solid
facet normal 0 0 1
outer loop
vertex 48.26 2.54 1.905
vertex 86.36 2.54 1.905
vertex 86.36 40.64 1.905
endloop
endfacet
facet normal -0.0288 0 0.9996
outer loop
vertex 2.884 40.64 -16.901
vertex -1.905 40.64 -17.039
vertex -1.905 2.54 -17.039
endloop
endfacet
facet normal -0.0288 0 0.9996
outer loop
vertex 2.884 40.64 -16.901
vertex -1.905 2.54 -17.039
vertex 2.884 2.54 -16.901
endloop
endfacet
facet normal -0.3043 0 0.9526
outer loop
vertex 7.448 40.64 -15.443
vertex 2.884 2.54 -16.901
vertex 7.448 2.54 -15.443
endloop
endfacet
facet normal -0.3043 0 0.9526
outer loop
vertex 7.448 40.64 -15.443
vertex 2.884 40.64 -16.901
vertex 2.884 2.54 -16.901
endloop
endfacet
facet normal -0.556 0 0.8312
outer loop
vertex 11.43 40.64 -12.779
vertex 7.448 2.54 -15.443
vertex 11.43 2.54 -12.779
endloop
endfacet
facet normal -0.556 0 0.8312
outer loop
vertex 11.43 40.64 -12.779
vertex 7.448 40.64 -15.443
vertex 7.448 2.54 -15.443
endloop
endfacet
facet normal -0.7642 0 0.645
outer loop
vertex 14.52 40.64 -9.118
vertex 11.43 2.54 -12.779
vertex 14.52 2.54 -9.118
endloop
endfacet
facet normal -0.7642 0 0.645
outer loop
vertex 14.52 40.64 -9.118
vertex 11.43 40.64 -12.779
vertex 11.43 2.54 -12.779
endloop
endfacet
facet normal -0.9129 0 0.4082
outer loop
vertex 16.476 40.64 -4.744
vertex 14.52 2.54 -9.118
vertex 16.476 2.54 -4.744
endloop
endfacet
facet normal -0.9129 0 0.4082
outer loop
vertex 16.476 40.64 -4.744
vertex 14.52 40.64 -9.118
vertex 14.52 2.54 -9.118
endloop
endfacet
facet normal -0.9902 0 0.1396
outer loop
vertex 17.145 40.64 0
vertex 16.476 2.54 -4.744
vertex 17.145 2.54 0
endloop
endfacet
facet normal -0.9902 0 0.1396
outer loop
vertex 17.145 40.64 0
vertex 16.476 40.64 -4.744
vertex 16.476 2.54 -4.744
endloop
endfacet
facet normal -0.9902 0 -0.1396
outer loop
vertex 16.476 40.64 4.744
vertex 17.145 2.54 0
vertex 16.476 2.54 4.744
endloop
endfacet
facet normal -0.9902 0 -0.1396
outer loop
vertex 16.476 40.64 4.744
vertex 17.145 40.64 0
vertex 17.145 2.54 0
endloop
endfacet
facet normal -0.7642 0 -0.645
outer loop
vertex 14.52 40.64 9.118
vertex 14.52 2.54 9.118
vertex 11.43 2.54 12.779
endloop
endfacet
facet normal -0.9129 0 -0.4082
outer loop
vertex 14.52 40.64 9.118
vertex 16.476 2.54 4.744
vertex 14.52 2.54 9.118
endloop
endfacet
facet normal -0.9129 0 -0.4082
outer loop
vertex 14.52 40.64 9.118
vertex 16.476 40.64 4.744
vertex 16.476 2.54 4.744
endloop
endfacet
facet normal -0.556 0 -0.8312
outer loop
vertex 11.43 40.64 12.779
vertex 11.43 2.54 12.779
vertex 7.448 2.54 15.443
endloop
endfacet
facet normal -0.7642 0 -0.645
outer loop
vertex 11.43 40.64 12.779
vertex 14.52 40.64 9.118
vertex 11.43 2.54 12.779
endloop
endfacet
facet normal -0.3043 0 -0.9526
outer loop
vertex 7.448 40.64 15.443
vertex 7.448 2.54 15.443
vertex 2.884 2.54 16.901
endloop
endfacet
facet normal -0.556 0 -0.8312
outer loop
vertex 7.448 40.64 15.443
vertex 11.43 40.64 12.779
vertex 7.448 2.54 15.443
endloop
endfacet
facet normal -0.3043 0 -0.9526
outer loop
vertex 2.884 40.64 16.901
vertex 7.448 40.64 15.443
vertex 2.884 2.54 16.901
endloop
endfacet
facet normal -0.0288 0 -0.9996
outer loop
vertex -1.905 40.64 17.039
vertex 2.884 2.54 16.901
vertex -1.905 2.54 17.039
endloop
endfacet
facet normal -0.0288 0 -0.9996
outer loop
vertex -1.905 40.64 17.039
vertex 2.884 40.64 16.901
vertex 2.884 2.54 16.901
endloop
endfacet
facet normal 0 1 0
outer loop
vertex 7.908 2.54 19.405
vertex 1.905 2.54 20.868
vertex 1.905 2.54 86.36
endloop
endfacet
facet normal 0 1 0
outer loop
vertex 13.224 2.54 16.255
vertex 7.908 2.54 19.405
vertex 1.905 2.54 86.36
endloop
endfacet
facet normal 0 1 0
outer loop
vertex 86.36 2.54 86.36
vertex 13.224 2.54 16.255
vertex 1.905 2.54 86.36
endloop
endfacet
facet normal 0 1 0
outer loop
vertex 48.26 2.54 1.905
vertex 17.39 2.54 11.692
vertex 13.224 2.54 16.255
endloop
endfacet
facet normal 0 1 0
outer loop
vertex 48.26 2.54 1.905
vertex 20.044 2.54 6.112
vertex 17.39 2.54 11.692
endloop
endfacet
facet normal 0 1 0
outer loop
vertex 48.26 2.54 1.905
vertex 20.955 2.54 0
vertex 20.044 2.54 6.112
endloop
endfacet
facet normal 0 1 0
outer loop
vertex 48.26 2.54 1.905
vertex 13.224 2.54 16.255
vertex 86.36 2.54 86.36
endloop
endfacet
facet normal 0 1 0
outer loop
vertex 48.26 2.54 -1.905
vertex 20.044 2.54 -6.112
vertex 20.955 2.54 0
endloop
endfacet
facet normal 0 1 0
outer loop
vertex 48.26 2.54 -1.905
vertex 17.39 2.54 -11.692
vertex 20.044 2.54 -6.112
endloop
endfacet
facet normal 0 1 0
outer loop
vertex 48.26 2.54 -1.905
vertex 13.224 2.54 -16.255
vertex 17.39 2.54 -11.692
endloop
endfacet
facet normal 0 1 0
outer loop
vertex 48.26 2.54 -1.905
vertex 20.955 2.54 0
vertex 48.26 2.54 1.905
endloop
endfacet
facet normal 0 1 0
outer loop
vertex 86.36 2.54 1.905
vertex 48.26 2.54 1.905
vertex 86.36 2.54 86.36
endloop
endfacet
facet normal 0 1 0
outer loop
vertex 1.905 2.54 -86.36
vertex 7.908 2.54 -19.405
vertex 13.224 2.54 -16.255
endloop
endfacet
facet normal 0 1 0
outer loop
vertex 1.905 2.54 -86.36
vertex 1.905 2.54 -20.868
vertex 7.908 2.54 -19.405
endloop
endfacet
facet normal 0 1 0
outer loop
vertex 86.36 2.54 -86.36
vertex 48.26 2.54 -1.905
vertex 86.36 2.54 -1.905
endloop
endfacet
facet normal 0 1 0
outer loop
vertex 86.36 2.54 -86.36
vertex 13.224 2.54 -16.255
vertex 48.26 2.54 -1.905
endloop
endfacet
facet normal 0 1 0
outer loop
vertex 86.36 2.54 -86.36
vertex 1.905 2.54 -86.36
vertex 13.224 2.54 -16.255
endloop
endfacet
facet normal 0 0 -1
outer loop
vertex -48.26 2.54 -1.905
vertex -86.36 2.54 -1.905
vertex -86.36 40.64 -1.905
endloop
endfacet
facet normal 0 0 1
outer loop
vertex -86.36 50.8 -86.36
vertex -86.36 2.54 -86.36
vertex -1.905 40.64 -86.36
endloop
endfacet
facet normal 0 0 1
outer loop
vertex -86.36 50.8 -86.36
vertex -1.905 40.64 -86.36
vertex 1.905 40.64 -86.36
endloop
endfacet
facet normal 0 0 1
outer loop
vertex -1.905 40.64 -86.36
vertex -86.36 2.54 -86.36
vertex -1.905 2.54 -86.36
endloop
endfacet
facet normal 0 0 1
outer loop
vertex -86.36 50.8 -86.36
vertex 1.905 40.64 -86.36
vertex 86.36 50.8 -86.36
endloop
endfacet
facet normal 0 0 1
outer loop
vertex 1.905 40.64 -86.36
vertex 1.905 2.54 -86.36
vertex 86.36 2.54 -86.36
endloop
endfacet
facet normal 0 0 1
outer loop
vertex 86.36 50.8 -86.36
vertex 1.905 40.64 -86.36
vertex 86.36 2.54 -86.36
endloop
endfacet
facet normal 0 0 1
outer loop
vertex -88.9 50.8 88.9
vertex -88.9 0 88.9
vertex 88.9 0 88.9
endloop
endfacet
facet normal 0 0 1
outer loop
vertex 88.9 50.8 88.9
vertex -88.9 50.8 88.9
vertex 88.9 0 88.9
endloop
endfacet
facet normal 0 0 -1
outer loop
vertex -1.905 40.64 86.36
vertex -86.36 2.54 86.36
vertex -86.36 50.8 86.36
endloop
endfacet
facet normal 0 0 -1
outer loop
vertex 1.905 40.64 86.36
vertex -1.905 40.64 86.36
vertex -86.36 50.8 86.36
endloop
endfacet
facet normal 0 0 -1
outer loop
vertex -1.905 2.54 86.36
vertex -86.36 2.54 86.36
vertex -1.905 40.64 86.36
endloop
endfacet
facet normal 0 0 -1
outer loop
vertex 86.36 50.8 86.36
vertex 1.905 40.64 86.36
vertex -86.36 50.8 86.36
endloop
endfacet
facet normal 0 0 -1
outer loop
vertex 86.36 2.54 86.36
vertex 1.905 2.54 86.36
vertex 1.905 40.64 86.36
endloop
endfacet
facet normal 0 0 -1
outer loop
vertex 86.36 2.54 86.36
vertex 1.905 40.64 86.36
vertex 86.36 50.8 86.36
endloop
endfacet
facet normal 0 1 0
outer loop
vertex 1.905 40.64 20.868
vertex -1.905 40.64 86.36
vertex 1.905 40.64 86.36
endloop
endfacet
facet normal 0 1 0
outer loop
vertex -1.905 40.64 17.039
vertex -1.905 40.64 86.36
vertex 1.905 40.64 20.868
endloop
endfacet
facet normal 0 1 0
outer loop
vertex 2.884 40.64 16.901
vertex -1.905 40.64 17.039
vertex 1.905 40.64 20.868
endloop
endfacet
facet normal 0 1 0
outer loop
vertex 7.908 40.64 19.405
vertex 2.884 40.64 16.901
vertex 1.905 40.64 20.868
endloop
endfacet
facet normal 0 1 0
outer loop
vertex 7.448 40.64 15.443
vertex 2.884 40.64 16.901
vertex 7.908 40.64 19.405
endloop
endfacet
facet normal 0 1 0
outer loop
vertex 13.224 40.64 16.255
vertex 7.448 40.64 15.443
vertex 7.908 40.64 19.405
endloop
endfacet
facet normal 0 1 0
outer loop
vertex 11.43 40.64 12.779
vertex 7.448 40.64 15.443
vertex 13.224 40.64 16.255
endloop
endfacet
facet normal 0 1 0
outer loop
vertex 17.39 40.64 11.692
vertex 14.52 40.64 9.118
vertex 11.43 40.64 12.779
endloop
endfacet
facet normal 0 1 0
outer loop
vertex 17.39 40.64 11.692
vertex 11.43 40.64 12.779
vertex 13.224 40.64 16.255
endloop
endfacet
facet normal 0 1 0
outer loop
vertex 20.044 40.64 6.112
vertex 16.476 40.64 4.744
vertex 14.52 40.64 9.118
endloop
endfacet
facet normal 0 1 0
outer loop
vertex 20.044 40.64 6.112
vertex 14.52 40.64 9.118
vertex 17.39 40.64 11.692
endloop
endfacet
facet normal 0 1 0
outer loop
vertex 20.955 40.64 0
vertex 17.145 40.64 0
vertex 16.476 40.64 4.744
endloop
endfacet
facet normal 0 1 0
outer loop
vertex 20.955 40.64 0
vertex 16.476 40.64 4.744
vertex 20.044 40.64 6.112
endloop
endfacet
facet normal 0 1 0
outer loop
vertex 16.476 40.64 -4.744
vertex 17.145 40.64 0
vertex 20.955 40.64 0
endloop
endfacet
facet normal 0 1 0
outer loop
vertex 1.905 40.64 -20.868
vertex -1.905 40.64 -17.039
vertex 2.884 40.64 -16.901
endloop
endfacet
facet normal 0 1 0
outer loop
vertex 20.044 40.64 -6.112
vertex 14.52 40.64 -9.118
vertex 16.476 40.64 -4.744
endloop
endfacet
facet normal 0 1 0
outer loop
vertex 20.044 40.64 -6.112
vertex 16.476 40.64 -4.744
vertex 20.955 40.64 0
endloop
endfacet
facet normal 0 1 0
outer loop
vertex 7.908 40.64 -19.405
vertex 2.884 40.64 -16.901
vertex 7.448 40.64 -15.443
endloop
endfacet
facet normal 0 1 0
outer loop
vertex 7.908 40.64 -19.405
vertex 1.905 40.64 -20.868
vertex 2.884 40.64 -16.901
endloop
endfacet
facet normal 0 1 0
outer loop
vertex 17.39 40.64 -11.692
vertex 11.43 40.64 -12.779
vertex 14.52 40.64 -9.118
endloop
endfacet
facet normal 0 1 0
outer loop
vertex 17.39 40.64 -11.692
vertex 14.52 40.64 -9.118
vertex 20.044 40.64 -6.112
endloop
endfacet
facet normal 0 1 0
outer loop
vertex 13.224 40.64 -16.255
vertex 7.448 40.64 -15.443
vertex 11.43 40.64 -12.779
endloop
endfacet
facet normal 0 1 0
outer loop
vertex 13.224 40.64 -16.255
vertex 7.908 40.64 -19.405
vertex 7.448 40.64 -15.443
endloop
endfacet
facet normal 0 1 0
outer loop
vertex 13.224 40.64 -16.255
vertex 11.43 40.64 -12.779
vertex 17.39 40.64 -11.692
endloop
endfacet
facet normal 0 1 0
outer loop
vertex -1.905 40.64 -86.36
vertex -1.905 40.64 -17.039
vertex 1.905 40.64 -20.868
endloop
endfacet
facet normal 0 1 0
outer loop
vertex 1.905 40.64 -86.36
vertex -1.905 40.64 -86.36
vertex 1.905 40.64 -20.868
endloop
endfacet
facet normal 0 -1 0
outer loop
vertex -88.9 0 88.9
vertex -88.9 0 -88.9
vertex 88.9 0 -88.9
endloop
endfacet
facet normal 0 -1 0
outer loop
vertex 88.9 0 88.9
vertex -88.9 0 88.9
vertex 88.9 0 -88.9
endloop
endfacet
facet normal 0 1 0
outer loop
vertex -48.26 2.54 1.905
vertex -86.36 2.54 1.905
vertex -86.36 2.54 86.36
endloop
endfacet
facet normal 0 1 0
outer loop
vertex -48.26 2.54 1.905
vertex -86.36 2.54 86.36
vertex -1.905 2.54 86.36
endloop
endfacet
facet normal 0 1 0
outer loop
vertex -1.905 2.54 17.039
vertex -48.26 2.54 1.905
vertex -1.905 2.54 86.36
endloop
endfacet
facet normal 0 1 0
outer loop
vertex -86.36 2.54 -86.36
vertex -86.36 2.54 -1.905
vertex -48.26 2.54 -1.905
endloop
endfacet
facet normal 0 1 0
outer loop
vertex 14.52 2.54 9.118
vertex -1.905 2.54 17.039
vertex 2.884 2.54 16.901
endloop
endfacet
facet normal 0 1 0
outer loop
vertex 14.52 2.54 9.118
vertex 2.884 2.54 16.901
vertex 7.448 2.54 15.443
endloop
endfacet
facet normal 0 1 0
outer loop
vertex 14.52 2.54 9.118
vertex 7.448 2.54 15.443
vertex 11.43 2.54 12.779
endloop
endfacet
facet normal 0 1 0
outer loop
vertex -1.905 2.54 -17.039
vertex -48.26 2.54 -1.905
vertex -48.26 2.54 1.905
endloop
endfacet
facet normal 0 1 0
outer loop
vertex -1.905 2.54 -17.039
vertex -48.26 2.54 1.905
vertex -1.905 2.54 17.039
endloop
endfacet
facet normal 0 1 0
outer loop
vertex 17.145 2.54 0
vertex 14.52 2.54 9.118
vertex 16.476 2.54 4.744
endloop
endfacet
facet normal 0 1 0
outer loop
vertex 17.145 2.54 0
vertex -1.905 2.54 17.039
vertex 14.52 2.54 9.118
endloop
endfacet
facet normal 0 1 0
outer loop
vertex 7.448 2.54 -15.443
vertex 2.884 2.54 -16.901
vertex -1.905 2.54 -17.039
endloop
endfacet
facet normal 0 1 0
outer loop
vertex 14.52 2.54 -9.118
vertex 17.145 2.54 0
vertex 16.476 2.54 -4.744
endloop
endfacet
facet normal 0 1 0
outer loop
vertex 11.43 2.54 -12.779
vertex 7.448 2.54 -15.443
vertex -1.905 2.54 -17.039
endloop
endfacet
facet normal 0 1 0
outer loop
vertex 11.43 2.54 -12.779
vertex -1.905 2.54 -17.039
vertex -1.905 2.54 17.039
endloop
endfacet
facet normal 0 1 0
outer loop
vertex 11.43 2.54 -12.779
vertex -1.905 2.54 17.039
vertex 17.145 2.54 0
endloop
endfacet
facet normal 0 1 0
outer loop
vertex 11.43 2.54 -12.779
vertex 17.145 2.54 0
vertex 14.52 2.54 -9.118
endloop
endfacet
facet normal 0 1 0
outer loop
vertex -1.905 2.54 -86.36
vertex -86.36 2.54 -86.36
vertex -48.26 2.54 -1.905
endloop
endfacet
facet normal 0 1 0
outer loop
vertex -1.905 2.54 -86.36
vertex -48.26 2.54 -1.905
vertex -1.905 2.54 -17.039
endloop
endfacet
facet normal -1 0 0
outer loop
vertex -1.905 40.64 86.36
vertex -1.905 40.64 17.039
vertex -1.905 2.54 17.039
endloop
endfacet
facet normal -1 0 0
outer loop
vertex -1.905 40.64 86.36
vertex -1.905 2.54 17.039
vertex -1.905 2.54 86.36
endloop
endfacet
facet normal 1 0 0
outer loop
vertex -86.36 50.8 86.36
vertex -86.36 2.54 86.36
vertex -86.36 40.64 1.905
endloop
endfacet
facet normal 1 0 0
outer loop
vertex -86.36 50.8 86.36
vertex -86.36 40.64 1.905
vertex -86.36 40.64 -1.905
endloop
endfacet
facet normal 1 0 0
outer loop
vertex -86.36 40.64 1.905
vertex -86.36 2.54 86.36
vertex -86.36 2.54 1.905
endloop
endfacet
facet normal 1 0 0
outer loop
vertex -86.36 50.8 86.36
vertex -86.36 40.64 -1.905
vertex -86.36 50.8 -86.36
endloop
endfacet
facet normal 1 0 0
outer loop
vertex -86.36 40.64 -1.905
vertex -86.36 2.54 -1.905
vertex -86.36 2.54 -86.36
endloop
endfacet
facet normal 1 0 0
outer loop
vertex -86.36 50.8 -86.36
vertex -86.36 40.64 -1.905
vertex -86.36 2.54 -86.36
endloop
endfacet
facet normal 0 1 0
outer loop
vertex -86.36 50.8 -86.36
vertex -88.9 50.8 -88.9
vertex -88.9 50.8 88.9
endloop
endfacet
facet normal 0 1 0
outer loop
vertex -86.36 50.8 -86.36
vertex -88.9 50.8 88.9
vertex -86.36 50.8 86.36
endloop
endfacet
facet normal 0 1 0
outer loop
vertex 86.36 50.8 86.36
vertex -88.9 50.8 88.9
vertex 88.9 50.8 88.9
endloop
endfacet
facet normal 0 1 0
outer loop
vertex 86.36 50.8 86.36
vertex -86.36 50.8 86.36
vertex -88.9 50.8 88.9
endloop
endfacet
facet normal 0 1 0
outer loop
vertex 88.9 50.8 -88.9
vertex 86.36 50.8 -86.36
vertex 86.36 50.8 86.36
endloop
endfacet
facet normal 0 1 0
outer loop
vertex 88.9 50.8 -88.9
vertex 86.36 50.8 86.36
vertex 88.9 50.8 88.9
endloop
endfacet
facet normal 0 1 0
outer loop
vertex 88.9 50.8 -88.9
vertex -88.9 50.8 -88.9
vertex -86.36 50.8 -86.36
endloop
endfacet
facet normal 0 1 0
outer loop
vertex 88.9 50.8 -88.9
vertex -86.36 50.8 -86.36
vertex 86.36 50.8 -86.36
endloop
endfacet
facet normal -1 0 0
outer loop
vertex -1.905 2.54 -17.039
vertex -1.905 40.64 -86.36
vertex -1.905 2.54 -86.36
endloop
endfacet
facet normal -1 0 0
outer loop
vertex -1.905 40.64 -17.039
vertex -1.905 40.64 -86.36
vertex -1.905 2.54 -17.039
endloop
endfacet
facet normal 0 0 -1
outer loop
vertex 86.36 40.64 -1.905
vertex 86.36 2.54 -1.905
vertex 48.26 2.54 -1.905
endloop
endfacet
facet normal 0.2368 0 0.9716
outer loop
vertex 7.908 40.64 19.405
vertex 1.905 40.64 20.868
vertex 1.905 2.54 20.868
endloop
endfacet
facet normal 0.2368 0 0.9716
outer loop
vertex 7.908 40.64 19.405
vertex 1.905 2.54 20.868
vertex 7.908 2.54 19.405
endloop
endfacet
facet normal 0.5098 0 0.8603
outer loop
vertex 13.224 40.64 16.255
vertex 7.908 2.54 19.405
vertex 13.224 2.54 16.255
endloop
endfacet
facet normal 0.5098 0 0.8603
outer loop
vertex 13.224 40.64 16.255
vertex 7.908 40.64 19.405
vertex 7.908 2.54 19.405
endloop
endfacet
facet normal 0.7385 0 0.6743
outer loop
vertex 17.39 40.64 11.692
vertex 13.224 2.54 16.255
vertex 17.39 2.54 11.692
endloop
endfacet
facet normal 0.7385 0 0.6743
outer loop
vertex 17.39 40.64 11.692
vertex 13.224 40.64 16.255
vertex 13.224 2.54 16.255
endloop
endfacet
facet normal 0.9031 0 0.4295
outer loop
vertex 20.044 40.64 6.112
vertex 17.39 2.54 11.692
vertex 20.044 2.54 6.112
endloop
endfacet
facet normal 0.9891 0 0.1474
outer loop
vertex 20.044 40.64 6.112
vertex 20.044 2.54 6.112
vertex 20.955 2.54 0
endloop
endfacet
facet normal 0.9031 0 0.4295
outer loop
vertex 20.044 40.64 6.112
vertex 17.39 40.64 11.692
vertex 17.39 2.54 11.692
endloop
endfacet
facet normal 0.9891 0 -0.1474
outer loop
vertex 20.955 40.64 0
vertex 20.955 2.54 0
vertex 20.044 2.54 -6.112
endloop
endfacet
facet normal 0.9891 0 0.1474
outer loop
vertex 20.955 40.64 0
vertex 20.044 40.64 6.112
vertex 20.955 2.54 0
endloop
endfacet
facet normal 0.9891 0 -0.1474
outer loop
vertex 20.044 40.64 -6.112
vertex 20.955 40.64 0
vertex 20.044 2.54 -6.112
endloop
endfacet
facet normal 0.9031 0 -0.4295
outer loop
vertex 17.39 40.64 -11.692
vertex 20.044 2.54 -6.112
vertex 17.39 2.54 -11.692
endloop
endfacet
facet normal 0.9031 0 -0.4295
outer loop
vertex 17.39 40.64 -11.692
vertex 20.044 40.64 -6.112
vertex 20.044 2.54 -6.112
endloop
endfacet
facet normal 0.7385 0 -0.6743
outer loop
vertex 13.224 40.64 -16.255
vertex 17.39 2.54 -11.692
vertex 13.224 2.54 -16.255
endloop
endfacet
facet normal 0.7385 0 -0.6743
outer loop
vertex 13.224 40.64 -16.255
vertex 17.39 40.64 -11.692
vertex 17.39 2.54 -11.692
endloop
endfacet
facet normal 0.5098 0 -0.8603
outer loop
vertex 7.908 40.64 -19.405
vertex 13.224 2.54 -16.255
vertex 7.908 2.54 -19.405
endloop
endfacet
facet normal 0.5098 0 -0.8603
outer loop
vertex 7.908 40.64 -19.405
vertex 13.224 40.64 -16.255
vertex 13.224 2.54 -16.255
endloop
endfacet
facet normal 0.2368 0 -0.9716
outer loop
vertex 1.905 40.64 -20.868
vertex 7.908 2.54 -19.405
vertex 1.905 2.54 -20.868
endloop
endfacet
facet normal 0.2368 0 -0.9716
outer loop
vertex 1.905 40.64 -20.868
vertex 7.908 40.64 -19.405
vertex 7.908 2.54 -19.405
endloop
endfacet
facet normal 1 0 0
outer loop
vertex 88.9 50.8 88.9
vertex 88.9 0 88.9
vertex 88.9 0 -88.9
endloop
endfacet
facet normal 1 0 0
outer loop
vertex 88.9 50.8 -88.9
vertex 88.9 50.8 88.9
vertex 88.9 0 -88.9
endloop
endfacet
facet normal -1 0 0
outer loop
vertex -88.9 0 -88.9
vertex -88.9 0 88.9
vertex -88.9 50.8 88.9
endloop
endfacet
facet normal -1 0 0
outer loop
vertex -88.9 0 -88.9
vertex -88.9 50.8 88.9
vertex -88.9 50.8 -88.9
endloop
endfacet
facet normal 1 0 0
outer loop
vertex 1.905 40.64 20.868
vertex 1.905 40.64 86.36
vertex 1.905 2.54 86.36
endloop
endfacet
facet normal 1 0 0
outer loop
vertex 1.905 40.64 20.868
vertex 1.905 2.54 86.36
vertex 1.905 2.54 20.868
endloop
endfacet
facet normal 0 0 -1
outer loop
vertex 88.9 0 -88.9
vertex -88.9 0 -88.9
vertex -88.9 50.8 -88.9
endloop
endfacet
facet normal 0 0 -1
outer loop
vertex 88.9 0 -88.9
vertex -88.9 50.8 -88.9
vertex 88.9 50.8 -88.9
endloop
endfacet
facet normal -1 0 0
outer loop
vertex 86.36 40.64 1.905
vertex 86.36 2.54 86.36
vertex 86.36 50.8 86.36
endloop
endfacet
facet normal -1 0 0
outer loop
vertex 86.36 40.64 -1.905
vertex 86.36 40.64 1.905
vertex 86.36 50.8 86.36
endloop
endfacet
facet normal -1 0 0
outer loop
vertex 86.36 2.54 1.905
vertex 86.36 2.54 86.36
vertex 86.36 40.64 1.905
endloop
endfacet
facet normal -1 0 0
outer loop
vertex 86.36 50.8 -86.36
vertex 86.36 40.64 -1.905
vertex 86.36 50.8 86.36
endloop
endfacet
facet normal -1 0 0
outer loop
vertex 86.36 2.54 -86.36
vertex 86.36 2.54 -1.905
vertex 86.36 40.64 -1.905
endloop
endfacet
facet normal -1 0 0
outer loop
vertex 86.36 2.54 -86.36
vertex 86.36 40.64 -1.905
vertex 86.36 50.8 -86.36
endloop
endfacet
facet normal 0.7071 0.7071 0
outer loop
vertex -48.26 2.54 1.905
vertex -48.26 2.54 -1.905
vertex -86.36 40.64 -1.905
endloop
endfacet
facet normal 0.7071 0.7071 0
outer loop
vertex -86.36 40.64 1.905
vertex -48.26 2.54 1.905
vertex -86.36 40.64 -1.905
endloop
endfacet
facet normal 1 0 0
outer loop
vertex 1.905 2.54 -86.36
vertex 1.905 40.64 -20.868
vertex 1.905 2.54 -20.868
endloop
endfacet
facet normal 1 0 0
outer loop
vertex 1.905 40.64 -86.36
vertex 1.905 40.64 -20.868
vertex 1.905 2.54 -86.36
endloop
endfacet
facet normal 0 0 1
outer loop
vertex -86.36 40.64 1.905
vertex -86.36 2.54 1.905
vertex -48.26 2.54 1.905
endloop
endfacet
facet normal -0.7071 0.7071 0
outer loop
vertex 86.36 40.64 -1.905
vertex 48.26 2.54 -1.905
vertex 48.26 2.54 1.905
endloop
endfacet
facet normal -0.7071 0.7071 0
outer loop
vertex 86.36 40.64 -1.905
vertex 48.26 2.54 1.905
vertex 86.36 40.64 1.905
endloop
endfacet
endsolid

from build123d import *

# Parameters (mm, degrees)
SKETCH1_W           = 177.8
SKETCH1_H           = 177.8
BOSS_EXTRUDE1_DEPTH = 50.8
SHELL1_T            = -2.54
RIB2_REACH          = 137.599
SKETCH2_WALL_W      = 327.079324328
SKETCH2_WALL_H      = 3.81
RIB3_REACH          = 134.129


with BuildPart() as part:
    # Sketch1 → Boss-Extrude1 (new body)
    with BuildSketch(Plane(origin=(0, 0, 0), x_dir=(1, 0, 0), z_dir=(0, 1, 0))):
        Rectangle(SKETCH1_W, SKETCH1_H)
    extrude(amount=BOSS_EXTRUDE1_DEPTH)

    # Shell1
    shell1_openings = [part.faces().sort_by_distance(p)[0] for p in [
        (0, 50.8, 0),
    ]]
    offset(amount=SHELL1_T, openings=shell1_openings, kind=Kind.INTERSECTION)

    # Sketch2 wall → Rib2 (add, up to next)
    with BuildSketch(Plane(origin=(-67.31, 21.59, 0), x_dir=(0.707106781187, -0.707106781187, 0), z_dir=(0.707106781187, 0.707106781187, 0)), mode=Mode.PRIVATE) as rib2_sk1:
        Rectangle(SKETCH2_WALL_W, SKETCH2_WALL_H)
    rib2_tool1 = extrude(rib2_sk1.sketch, amount=-RIB2_REACH, mode=Mode.PRIVATE) - part.part
    rib2 = rib2_tool1.solids().sort_by_distance((-67.31, 21.59, 0))[0]
    add(rib2)

    # Mirror1: Rib2 across plane
    add(rib2.mirror(Plane(origin=(0, 0, 0), x_dir=(0, 0, 1), z_dir=(1, 0, 0))))

    # Sketch3 walls → Rib3 (add, up to next)
    with BuildSketch(Plane(origin=(0, 40.64, 0), x_dir=(1, 0, 0), z_dir=(0, 1, 0)), mode=Mode.PRIVATE) as rib3_sk1:
        with BuildLine():
            Line((1.905, -219.488837125), (1.905, -20.868229441))
            ThreePointArc((1.905, -20.868229441), (20.955, 0), (1.905, 20.868229441))
            Line((1.905, 20.868229441), (1.905, 219.488837125))
            Line((1.905, 219.488837125), (-1.905, 219.488837125))
            Line((-1.905, 219.488837125), (-1.905, 17.038837989))
            ThreePointArc((-1.905, 17.038837989), (17.145, 0), (-1.905, -17.038837989))
            Line((-1.905, -17.038837989), (-1.905, -219.488837125))
            Line((-1.905, -219.488837125), (1.905, -219.488837125))
        make_face()
    rib3_tool1 = extrude(rib3_sk1.sketch, amount=-RIB3_REACH, mode=Mode.PRIVATE) - part.part
    add(rib3_tool1.solids().sort_by_distance((19.05, 40.64, 0))[0])


solid = part.part
